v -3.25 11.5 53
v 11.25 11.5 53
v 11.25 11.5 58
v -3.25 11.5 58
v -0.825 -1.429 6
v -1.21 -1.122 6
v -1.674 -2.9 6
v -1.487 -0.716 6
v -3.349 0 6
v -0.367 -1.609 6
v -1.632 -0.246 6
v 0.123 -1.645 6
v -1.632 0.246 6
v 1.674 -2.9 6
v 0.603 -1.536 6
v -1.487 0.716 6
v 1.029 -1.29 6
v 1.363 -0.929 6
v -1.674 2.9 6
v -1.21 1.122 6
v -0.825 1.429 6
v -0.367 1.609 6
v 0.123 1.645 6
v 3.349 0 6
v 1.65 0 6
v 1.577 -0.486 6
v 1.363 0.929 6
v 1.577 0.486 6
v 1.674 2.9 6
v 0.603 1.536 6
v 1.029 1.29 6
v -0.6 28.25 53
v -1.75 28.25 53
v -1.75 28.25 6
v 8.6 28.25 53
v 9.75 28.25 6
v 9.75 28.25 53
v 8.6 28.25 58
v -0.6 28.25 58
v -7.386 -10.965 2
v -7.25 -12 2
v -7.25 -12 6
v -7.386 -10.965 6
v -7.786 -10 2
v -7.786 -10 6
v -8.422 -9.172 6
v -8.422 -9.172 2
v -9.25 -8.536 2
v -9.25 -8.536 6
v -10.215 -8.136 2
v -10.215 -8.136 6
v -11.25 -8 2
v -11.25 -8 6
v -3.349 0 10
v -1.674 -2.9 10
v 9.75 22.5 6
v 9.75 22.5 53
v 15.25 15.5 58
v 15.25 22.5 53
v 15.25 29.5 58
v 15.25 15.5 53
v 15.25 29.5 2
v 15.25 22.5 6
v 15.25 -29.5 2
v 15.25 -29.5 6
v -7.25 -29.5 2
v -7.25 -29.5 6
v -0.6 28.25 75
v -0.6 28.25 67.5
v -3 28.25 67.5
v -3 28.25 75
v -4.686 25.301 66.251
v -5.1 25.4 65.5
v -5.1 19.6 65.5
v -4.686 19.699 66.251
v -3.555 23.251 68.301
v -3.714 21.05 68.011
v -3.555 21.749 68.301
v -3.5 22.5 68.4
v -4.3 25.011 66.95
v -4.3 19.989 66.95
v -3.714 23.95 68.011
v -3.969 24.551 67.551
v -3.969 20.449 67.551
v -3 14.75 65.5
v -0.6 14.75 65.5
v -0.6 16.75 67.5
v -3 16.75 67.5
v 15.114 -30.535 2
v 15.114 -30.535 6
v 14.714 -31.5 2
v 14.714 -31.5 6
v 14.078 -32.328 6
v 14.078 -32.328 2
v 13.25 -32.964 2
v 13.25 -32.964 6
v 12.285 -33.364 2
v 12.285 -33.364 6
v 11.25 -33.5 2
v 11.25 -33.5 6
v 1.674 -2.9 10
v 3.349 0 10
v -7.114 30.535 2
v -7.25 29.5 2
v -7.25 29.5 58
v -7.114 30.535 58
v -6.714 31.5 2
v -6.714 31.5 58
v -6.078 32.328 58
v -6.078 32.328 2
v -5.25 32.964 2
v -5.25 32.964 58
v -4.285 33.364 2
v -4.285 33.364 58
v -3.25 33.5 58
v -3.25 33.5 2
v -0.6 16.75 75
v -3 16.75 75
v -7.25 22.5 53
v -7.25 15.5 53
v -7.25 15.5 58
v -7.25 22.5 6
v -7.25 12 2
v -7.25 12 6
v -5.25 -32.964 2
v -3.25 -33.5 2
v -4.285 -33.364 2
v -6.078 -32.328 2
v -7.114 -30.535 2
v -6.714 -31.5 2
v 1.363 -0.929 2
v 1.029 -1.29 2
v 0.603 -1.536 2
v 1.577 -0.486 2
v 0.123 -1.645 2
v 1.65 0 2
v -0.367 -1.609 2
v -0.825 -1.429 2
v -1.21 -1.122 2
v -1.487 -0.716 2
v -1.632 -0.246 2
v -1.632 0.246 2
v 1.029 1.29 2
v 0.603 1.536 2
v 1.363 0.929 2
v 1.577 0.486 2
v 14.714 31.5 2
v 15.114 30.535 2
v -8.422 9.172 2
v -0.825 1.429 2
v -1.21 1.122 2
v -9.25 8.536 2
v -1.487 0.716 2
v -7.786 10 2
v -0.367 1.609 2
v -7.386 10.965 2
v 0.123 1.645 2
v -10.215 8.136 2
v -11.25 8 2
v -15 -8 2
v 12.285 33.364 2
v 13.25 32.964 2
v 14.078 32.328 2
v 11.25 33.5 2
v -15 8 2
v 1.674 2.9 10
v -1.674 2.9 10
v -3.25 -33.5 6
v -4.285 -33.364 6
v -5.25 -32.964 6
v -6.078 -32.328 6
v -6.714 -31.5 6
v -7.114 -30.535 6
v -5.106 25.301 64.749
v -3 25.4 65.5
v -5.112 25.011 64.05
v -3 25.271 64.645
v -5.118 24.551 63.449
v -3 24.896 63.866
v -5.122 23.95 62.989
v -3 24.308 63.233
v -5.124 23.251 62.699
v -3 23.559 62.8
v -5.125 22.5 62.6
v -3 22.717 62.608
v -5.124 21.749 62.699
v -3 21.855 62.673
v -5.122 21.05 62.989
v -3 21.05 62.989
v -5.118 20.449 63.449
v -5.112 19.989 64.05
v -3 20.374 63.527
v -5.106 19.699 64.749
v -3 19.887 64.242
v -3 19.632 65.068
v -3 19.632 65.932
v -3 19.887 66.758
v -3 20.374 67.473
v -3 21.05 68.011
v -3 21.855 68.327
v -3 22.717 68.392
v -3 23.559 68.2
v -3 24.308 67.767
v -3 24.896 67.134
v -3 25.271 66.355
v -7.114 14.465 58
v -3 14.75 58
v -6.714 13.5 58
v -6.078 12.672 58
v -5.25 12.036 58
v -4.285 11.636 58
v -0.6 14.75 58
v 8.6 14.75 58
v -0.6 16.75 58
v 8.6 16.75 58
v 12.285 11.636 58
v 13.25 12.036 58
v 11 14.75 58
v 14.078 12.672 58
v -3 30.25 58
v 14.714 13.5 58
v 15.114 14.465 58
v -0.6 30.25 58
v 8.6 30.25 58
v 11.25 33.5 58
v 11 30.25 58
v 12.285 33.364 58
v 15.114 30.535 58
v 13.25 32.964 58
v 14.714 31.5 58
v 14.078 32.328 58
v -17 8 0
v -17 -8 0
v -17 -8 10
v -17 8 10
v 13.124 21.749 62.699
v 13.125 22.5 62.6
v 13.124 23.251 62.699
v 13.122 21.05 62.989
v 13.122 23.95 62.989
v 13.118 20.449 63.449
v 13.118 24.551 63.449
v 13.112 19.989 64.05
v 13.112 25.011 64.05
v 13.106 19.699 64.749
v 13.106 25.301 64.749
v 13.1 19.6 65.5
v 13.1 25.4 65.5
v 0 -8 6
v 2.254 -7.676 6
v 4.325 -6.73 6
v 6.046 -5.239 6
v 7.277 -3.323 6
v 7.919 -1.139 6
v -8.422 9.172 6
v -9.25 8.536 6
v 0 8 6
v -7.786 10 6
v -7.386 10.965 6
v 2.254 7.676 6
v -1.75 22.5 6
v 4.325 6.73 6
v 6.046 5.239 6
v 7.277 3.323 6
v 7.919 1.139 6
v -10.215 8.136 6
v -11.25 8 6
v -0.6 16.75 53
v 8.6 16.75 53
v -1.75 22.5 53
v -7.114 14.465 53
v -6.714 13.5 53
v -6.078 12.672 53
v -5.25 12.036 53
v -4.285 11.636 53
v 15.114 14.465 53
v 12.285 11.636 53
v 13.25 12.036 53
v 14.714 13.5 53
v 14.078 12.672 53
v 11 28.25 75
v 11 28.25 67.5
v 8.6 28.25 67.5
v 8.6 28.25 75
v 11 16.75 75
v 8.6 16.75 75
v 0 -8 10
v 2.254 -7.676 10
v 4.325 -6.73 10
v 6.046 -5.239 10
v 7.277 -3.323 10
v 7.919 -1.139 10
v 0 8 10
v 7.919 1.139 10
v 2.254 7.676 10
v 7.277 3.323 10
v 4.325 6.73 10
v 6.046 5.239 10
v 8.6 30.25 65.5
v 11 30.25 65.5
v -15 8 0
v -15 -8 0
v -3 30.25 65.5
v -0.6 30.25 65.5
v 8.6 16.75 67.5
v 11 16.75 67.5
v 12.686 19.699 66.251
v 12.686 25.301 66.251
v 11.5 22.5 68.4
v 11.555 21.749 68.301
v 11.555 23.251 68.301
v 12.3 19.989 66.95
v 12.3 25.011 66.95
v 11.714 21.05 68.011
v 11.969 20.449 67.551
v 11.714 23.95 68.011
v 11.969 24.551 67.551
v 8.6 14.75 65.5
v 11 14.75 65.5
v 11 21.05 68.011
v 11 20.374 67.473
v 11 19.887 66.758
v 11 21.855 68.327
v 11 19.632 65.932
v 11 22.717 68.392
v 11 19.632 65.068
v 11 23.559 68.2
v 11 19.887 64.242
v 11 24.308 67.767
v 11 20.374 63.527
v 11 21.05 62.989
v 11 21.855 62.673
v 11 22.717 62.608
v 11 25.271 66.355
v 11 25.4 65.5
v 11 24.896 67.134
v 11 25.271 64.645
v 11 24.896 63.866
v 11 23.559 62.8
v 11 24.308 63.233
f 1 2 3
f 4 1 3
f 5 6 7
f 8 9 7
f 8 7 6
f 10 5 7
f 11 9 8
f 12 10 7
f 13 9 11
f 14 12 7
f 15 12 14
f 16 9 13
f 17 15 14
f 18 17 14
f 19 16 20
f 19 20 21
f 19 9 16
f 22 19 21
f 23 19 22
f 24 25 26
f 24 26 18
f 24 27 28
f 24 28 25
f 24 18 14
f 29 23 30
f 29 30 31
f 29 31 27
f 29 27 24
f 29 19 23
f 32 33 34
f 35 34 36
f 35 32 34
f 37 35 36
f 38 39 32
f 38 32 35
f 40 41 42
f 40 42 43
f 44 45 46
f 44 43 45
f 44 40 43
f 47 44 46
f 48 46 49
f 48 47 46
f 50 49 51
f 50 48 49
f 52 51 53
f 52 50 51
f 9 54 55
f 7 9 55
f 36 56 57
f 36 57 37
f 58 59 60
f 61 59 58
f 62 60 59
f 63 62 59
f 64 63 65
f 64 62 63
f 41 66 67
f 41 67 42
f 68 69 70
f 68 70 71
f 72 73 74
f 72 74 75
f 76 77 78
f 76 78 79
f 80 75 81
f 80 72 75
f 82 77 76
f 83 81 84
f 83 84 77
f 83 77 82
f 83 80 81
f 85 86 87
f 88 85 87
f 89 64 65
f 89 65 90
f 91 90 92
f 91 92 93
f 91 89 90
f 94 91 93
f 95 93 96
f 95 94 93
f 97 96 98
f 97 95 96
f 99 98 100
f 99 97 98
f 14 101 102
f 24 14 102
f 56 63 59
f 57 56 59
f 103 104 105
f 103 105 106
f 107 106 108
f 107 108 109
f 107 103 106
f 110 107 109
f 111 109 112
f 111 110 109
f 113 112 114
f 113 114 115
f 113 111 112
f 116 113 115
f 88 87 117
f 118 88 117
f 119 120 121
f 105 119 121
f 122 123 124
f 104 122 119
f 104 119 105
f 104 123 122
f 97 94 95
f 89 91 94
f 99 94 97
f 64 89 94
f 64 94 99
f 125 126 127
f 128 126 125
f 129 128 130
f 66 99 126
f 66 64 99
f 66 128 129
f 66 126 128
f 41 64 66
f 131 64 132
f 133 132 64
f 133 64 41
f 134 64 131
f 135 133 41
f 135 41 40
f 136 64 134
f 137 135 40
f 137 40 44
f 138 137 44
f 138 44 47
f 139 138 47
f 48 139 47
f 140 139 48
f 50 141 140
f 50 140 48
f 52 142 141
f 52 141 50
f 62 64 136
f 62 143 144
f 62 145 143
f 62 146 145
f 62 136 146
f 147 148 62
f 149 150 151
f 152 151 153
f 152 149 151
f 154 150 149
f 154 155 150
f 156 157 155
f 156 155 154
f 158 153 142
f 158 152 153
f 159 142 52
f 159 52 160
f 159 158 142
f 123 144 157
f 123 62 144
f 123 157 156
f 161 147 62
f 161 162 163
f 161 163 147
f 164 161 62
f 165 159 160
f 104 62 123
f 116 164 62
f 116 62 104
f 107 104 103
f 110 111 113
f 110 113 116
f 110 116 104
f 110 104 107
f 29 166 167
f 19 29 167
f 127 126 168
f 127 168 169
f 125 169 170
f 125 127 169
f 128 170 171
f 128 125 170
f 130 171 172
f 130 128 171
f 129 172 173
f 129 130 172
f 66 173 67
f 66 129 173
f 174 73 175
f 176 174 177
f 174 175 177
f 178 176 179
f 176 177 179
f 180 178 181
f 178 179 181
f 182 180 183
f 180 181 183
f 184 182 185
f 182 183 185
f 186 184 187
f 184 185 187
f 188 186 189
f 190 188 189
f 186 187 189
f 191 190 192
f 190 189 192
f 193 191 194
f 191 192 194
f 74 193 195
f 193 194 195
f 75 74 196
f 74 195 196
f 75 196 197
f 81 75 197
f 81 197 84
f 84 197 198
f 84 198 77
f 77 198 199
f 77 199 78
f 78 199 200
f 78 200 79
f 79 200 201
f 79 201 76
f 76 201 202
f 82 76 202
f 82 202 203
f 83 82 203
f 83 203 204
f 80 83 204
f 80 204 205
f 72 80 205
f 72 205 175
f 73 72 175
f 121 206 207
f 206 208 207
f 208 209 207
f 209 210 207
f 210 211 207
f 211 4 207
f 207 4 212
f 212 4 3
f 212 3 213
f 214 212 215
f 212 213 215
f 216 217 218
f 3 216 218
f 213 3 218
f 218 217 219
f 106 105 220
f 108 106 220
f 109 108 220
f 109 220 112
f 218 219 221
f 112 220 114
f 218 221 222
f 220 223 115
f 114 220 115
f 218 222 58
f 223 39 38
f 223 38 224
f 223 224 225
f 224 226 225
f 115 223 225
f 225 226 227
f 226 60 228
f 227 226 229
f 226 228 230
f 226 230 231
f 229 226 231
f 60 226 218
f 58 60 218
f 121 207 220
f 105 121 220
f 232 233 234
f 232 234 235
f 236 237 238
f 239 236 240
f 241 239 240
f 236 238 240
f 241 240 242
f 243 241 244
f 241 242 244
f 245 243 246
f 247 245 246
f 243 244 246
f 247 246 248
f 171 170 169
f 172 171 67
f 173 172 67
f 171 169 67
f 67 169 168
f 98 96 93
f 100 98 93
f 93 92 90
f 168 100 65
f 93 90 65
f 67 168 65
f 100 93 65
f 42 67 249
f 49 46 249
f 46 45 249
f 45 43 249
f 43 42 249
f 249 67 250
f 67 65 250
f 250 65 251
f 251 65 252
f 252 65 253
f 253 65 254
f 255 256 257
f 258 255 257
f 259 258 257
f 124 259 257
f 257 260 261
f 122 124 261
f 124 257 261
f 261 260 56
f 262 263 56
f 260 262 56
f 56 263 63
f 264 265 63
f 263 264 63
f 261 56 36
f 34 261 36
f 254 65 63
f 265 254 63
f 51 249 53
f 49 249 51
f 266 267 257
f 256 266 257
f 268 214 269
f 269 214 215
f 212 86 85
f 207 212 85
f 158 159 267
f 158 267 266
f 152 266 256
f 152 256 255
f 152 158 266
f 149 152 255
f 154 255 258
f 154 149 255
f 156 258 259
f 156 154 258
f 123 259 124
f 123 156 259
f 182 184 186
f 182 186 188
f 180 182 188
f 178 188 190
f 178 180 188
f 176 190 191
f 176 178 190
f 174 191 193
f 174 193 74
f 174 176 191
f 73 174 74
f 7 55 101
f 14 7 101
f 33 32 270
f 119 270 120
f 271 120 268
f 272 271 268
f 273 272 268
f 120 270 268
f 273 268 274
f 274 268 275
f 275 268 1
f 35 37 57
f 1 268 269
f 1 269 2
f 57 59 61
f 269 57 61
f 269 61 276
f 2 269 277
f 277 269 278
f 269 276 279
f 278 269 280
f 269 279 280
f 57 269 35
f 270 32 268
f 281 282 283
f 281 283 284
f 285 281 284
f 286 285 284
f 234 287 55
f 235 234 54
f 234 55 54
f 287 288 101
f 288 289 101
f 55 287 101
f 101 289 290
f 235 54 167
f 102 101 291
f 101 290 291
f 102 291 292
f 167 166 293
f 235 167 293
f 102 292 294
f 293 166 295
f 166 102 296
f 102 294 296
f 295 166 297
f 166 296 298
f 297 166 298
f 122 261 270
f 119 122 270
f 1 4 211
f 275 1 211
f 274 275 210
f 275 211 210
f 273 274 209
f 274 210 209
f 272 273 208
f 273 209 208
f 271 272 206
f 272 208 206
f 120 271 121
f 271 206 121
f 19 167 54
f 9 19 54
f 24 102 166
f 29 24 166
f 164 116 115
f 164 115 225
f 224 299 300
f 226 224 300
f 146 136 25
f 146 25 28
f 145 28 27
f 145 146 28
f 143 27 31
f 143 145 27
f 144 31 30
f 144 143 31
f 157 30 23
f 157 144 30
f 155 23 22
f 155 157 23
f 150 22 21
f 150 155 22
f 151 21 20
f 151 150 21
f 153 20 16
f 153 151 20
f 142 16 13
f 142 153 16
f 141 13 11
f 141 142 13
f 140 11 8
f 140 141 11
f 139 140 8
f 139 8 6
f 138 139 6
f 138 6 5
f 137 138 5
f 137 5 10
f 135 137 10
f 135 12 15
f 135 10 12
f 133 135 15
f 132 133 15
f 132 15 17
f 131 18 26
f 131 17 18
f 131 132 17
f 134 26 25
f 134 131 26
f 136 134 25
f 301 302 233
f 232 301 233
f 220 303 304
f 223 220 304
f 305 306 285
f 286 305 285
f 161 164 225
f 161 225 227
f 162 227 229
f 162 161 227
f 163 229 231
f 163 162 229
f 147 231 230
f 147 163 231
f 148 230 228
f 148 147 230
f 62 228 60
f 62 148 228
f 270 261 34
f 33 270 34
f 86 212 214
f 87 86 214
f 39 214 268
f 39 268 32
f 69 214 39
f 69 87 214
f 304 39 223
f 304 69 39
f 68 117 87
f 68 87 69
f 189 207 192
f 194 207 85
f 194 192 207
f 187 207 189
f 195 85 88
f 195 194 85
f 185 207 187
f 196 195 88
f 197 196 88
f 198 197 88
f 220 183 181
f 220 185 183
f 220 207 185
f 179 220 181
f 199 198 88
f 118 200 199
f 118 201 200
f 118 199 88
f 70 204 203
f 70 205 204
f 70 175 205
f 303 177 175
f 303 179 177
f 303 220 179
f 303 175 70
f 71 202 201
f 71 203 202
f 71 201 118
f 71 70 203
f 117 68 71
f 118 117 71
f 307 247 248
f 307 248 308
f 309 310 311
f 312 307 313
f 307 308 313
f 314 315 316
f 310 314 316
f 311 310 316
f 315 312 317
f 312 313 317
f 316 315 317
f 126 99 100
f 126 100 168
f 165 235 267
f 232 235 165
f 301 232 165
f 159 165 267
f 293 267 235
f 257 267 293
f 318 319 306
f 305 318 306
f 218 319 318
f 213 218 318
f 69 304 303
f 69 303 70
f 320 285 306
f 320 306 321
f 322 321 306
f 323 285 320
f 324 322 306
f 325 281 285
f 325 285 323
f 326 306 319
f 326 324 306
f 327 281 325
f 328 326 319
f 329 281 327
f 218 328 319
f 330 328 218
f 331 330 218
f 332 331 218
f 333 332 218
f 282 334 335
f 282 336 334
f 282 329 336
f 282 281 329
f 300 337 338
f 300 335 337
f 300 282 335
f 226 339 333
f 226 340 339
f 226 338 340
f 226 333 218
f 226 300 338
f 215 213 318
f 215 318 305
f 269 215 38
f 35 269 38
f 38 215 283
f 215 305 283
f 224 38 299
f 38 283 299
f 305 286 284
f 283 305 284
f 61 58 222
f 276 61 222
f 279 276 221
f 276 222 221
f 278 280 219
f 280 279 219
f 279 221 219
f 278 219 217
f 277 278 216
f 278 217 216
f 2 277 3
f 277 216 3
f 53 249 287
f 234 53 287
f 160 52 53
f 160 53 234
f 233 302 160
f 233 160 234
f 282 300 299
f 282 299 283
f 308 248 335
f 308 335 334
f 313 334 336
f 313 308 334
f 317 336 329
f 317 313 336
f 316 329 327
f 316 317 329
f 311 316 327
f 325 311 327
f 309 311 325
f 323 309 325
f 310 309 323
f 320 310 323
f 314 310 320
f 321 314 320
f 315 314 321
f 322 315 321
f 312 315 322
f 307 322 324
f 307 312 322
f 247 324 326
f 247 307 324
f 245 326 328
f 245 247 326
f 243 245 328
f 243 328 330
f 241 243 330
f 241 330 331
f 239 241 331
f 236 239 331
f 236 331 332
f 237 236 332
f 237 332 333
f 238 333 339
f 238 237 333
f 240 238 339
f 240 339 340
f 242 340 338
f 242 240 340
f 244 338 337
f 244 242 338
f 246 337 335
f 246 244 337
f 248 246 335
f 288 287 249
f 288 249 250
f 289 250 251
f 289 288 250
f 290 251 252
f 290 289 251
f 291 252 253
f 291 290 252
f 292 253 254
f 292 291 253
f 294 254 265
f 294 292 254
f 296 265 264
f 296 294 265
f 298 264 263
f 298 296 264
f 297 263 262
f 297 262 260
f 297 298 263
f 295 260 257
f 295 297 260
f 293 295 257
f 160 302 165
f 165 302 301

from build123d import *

# Parameters (mm, degrees)
SKETCH1_R           = 1.65
BOSS_EXTRUDE1_DEPTH = 75
CUT_EXTRUDE3_REACH  = 90.246
CUT_EXTRUDE4_REACH  = 85.882
SKETCH5_W           = 9.2
SKETCH5_H           = 11.5
SKETCH6_W           = 11.5
SKETCH6_H           = 11.5
CUT_EXTRUDE5_DEPTH  = 47
SKETCH7_W           = 30.25
SKETCH7_H           = 67
CUT_EXTRUDE6_DEPTH  = 2
CUT_EXTRUDE7_DEPTH  = 4
SKETCH9_W           = 17
SKETCH9_H           = 22
SKETCH9_R           = 2.9
CUT_EXTRUDE8_DEPTH  = 4.25
CUT_EXTRUDE9_START  = -4.25
SKETCH10_W          = 17
SKETCH10_H          = 22
SKETCH10_R          = 2.9
CUT_EXTRUDE9_DEPTH  = 4.25
CUT_EXTRUDE10_DEPTH = 17
CUT_EXTRUDE11_START = -18.25
CUT_EXTRUDE11_DEPTH = 14
CUT_EXTRUDE12_REACH = 103.995


with BuildPart() as part:
    # Sketch1 → Boss-Extrude1 (new body)
    with BuildSketch(Plane.XY):
        with BuildLine():
            Line((-17, -8), (-17, 8))
            Line((-17, 8), (-11.25, 8))
            ThreePointArc((-11.25, 8), (-8.421572875, 9.171572875), (-7.25, 12))
            Line((-7.25, 12), (-7.25, 29.5))
            ThreePointArc((-7.25, 29.5), (-6.078427125, 32.328427125), (-3.25, 33.5))
            Line((-3.25, 33.5), (11.25, 33.5))
            ThreePointArc((11.25, 33.5), (14.078427125, 32.328427125), (15.25, 29.5))
            Line((15.25, 29.5), (15.25, -29.5))
            ThreePointArc((15.25, -29.5), (14.078427125, -32.328427125), (11.25, -33.5))
            Line((11.25, -33.5), (-3.25, -33.5))
            ThreePointArc((-3.25, -33.5), (-6.078427125, -32.328427125), (-7.25, -29.5))
            Line((-7.25, -29.5), (-7.25, -12))
            ThreePointArc((-7.25, -12), (-8.421572875, -9.171572875), (-11.25, -8))
            Line((-11.25, -8), (-17, -8))
        make_face()
        Circle(SKETCH1_R, mode=Mode.SUBTRACT)
    extrude(amount=BOSS_EXTRUDE1_DEPTH)

    # Cut-Extrude3: up to this face of the body (flat: up to its plane)
    cut_extrude3_end = Plane(part.part.faces().sort_by_distance((-17, 0, 37.5))[0])
    # Sketch4 → Cut-Extrude3 (cut, up to the picked face)
    with BuildSketch(Plane(origin=(15.25, 0, 0), x_dir=(0, 0, -1), z_dir=(1, 0, 0)), mode=Mode.PRIVATE) as cut_extrude3_sk1:
        Polygon((-75, 11.5), (-75, -33.5), (-6, -33.5), (-6, -8), (-10, -8), (-10, 8), (-6, 8), (-6, 22.5), (-53, 22.5), (-53, 11.5), align=None)
    cut_extrude3_tool1 = split(extrude(cut_extrude3_sk1.sketch, amount=-CUT_EXTRUDE3_REACH, mode=Mode.PRIVATE), bisect_by=cut_extrude3_end, keep=Keep.BOTH, mode=Mode.PRIVATE)
    add(cut_extrude3_tool1.solids().sort_by(Axis((15.25, -7.129286, 39.486228), (-1, 0, 0)))[0], mode=Mode.SUBTRACT)

    # Cut-Extrude4: up to this face of the body (flat: up to its plane)
    cut_extrude4_end = Plane(part.part.faces().sort_by_distance((3.873526685, 15.183797252, 6))[0])
    # Sketch5 → Cut-Extrude4 (cut, up to the picked face)
    with BuildSketch(Plane.XY.offset(75), mode=Mode.PRIVATE) as cut_extrude4_sk1:
        with Locations((4, 22.5)):
            Rectangle(SKETCH5_W, SKETCH5_H)
    cut_extrude4_tool1 = split(extrude(cut_extrude4_sk1.sketch, amount=-CUT_EXTRUDE4_REACH, mode=Mode.PRIVATE), bisect_by=cut_extrude4_end, keep=Keep.BOTH, mode=Mode.PRIVATE)
    # Sketch5 → Cut-Extrude4 (cut, up to the picked face)
    with BuildSketch(Plane.XY.offset(75), mode=Mode.PRIVATE) as cut_extrude4_sk2:
        with BuildLine():
            Line((11.25, 11.5), (15.25, 11.5))
            Line((15.25, 11.5), (15.25, 15.5))
            ThreePointArc((15.25, 15.5), (14.078427125, 12.671572875), (11.25, 11.5))
        make_face()
    cut_extrude4_tool2 = split(extrude(cut_extrude4_sk2.sketch, amount=-CUT_EXTRUDE4_REACH, mode=Mode.PRIVATE), bisect_by=cut_extrude4_end, keep=Keep.BOTH, mode=Mode.PRIVATE)
    # Sketch5 → Cut-Extrude4 (cut, up to the picked face)
    with BuildSketch(Plane.XY.offset(75), mode=Mode.PRIVATE) as cut_extrude4_sk3:
        with BuildLine():
            Line((-7.281373033, 11.5), (-3.25, 11.5))
            ThreePointArc((-3.25, 11.5), (-6.078427125, 12.671572875), (-7.25, 15.5))
            Line((-7.25, 15.5), (-7.25, 12))
            ThreePointArc((-7.25, 12), (-7.257850963, 11.74950835), (-7.281373033, 11.5))
        make_face()
    cut_extrude4_tool3 = split(extrude(cut_extrude4_sk3.sketch, amount=-CUT_EXTRUDE4_REACH, mode=Mode.PRIVATE), bisect_by=cut_extrude4_end, keep=Keep.BOTH, mode=Mode.PRIVATE)
    # Sketch5 → Cut-Extrude4 (cut, up to the picked face)
    with BuildSketch(Plane.XY.offset(75), mode=Mode.PRIVATE) as cut_extrude4_sk4:
        with BuildLine():
            Line((0, 8), (15.25, 8))
            Line((15.25, 8), (15.25, -8))
            Line((15.25, -8), (0, -8))
            ThreePointArc((0, -8), (8, 0), (0, 8))
        make_face()
    cut_extrude4_tool4 = split(extrude(cut_extrude4_sk4.sketch, amount=-CUT_EXTRUDE4_REACH, mode=Mode.PRIVATE), bisect_by=cut_extrude4_end, keep=Keep.BOTH, mode=Mode.PRIVATE)
    add(cut_extrude4_tool1.solids().sort_by(Axis((4, 22.5, 75), (0, 0, -1)))[0], mode=Mode.SUBTRACT)
    add(cut_extrude4_tool2.solids().sort_by(Axis((14.356528, 12.393472, 75), (0, 0, -1)))[0], mode=Mode.SUBTRACT)
    add(cut_extrude4_tool3.solids().sort_by(Axis((-6.357899, 12.392305, 75), (0, 0, -1)))[0], mode=Mode.SUBTRACT)
    add(cut_extrude4_tool4.solids().sort_by(Axis((10.588812, 0, 75), (0, 0, -1)))[0], mode=Mode.SUBTRACT)

    # Sketch6 → Cut-Extrude5 (cut)
    with BuildSketch(Plane.XY.offset(6)):
        with Locations((4, 22.5)):
            Rectangle(SKETCH6_W, SKETCH6_H)
    extrude(amount=CUT_EXTRUDE5_DEPTH, mode=Mode.SUBTRACT)

    # Sketch7 → Cut-Extrude6 (cut)
    with BuildSketch(Plane(origin=(0, 0, 0), x_dir=(-1, 0, 0), z_dir=(0, 0, -1))):
        with Locations((-0.125, 0)):
            Rectangle(SKETCH7_W, SKETCH7_H)
    extrude(amount=-CUT_EXTRUDE6_DEPTH, mode=Mode.SUBTRACT)

    # Sketch8 → Cut-Extrude7 (cut)
    with BuildSketch(Plane.XY.offset(10)):
        Polygon((3.348631561, 0), (1.674315781, 2.9), (-1.674315781, 2.9), (-3.348631561, 0), (-1.674315781, -2.9), (1.674315781, -2.9), align=None)
    extrude(amount=-CUT_EXTRUDE7_DEPTH, mode=Mode.SUBTRACT)

    # Sketch9 → Cut-Extrude8 (cut)
    with BuildSketch(Plane(origin=(15.25, 0, 0), x_dir=(0, 0, -1), z_dir=(1, 0, 0))):
        with Locations((-66.5, 22.5)):
            Rectangle(SKETCH9_W, SKETCH9_H)
        with Locations(Location((-65.5, 22.5, 0), (0, 0, 90))):
            Circle(SKETCH9_R, mode=Mode.SUBTRACT)
    extrude(amount=-CUT_EXTRUDE8_DEPTH, mode=Mode.SUBTRACT)

    # Sketch10 → Cut-Extrude9 (cut)
    with BuildSketch(Plane.ZY.offset(7.25).offset(CUT_EXTRUDE9_START)):
        with Locations((66.5, 22.5)):
            Rectangle(SKETCH10_W, SKETCH10_H)
        with Locations(Location((65.5, 22.5, 0), (0, 0, 90))):
            Circle(SKETCH10_R, mode=Mode.SUBTRACT)
    extrude(amount=CUT_EXTRUDE9_DEPTH, mode=Mode.SUBTRACT)

    # Sketch11 → Cut-Extrude10 (cut)
    with BuildSketch(Plane.XY.offset(75)):
        Polygon((-7.25, 14.75), (-7.25, 11.5), (15.25, 11.5), (15.25, 14.75), (8.6, 14.75), (8.6, 30.25), (15.25, 30.25), (15.25, 33.5), (-7.25, 33.5), (-7.25, 30.25), (-0.6, 30.25), (-0.6, 14.75), align=None)
    extrude(amount=-CUT_EXTRUDE10_DEPTH, mode=Mode.SUBTRACT)

    # Sketch12 → Cut-Extrude11 (cut)
    with BuildSketch(Plane.ZY.offset(7.25).offset(CUT_EXTRUDE11_START)):
        Polygon((65.5, 30.25), (67.5, 28.25), (75, 28.25), (75, 30.25), align=None)
        Polygon((65.5, 14.75), (67.5, 16.75), (75, 16.75), (75, 14.75), align=None)
    extrude(amount=CUT_EXTRUDE11_DEPTH, mode=Mode.SUBTRACT)

    # Cut-Extrude12: up to this face of the body (flat: up to its plane)
    cut_extrude12_end = Plane(part.part.faces().sort_by_distance((4, 11.5, 55.5))[0])
    # Sketch13 → Cut-Extrude12 (cut, up to the picked face)
    with BuildSketch(Plane(origin=(0, 33.5, 0), x_dir=(1, 0, 0), z_dir=(0, 1, 0)), mode=Mode.PRIVATE) as cut_extrude12_sk1:
        Polygon((-5.1, -65.5), (-3.5, -68.4), (-7.25, -68.4), (-7.25, -62.6), (-5.125, -62.6), align=None)
    cut_extrude12_tool1 = split(extrude(cut_extrude12_sk1.sketch, amount=-CUT_EXTRUDE12_REACH, mode=Mode.PRIVATE), bisect_by=cut_extrude12_end, keep=Keep.BOTH, mode=Mode.PRIVATE)
    # Sketch13 → Cut-Extrude12 (cut, up to the picked face)
    with BuildSketch(Plane(origin=(0, 33.5, 0), x_dir=(1, 0, 0), z_dir=(0, 1, 0)), mode=Mode.PRIVATE) as cut_extrude12_sk2:
        Polygon((13.1, -65.5), (11.5, -68.4), (15.25, -68.4), (15.25, -62.6), (13.125, -62.6), align=None)
    cut_extrude12_tool2 = split(extrude(cut_extrude12_sk2.sketch, amount=-CUT_EXTRUDE12_REACH, mode=Mode.PRIVATE), bisect_by=cut_extrude12_end, keep=Keep.BOTH, mode=Mode.PRIVATE)
    add(cut_extrude12_tool1.solids().sort_by(Axis((-5.924713, 33.5, 65.808763), (0, -1, 0)))[0], mode=Mode.SUBTRACT)
    add(cut_extrude12_tool2.solids().sort_by(Axis((13.924713, 33.5, 65.808763), (0, -1, 0)))[0], mode=Mode.SUBTRACT)


solid = part.part
